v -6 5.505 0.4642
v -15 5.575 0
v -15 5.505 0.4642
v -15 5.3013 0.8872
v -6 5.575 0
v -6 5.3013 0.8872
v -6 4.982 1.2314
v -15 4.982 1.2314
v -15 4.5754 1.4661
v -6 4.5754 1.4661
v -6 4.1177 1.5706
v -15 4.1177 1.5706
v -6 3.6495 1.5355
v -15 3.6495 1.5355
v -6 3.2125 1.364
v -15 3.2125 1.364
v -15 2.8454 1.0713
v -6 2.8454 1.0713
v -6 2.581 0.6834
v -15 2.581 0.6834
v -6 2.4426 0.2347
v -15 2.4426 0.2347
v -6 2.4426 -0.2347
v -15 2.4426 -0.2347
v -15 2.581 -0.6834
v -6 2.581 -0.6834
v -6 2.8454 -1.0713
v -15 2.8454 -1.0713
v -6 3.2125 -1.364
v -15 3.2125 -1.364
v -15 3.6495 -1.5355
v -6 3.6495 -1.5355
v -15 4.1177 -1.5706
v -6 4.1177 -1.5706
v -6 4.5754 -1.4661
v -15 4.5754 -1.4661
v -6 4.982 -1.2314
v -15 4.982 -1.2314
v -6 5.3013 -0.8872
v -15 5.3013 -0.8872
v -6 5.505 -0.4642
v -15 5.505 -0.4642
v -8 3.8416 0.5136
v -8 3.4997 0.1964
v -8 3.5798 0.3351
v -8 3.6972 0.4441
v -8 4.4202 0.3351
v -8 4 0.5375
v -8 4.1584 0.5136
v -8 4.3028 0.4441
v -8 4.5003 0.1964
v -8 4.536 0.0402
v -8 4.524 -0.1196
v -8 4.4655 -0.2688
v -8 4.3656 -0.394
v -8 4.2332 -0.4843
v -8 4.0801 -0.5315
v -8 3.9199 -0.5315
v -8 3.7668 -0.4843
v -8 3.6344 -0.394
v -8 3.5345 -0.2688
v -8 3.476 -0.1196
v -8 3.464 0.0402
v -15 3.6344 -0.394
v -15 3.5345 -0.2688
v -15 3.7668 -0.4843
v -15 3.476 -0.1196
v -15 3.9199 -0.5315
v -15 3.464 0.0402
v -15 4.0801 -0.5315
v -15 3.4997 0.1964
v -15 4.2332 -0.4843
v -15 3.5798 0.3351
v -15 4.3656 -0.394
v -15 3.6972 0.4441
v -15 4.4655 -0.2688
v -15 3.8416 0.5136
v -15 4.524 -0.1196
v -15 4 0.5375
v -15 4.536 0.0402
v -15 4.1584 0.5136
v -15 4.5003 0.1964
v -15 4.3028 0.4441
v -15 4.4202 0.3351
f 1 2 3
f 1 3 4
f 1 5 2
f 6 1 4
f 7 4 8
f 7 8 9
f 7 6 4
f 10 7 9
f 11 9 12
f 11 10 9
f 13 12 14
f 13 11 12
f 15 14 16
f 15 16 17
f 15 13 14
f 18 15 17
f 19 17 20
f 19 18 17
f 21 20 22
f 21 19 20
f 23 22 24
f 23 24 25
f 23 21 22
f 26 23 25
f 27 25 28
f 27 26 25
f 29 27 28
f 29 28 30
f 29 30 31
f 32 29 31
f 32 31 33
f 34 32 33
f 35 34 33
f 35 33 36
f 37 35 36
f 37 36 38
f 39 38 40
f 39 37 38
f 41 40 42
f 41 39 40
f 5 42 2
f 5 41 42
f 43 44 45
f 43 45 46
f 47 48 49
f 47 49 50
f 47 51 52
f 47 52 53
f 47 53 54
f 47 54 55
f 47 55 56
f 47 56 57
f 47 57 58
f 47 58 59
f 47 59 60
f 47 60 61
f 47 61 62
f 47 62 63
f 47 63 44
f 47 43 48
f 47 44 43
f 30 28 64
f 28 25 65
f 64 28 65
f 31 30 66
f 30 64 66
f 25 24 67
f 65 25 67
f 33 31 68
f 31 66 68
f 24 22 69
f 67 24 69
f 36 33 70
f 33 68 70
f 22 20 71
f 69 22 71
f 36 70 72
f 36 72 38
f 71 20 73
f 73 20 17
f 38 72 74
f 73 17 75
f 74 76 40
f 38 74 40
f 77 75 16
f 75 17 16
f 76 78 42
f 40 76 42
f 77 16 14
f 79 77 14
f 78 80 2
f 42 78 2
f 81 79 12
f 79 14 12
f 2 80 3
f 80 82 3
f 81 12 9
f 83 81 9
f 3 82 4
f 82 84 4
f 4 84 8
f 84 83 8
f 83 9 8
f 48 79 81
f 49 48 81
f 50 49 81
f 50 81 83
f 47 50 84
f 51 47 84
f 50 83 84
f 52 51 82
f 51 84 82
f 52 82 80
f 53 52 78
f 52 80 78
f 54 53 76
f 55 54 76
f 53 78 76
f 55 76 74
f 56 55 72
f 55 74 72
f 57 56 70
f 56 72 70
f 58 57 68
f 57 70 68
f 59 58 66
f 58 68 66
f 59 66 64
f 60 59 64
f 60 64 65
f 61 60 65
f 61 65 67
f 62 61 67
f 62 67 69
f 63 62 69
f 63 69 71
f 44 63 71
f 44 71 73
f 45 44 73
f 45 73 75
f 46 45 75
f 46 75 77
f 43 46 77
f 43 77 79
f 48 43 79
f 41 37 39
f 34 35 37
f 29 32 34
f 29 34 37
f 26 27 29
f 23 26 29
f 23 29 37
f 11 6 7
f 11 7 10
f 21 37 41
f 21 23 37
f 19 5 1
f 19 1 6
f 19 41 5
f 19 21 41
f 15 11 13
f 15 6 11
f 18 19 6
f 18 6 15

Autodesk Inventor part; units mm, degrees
ref_plane "YZ Plane" through (0, 0, 0) normal (1, 0, 0) x (0, 1, 0)
ref_plane "XZ Plane" through (0, 0, 0) normal (0, 1, 0) x (-1, 0, 0)
ref_plane "XY Plane" through (0, 0, 0) normal (0, 0, 1) x (1, 0, 0)
sketch "Sketch1" plane through (0, 0, 0) normal (0, 1, 0) x (-1, 0, 0)
  arc A0 (0, -5) -> (0, 5) centre (0, 0) ccw
  line L0 (0, 5) -> (0, -5)
  dimension "d0" = 10
extrude "Extrusion1" add sketch "Sketch1" along normal blind 10
sketch "Sketch2" plane through (0, 0, 0) normal (1, 0, 0) x (0, 1, 0)
  line L0 (8.0172, -4.5) -> (8.0172, 4.5)
  line L1 (8.0172, 4.5) -> (2.5172, 4.5)
  line L2 (2.5172, -4.5) -> (0.0172, -2)
  line L3 (2.5172, 4.5) -> (0.0172, 2)
  line L4 (0.0172, -2) -> (0.0172, 2)
  line L5 (8.0172, -4.5) -> (2.5172, -4.5)
  point P0 (0, 0)
  dimension "d3" = 9
  dimension "d4" = 8
sketch "Sketch3" plane through (0, 0, 0) normal (1, 0, 0) x (0, 1, 0)
  line L0 (0, 2) -> (3, 5)
  arc A0 (3, 5) -> (0, 2) centre (1, 4) ccw
  line L1 (0, -2) -> (4, -6)
  arc A1 (0, -2) -> (4, -6) centre (1.75, -4.25) ccw
  line L2 (8.0325, 5) -> (11, 5)
  line L3 (11, 5) -> (11, -6)
  line L4 (11, -6) -> (8.0325, -6)
  line L5 (8.0325, -6) -> (8.0325, 5)
  line L6 (2.4911, 4.4911) -> (5, 7)
  line L7 (2.4911, 4.4911) -> (8.0325, 4.4911)
  arc A2 (8.0325, 4.4911) -> (5, 7) centre (7, 6.3303) ccw
  line L8 (2.4911, -4.4911) -> (8.5706, -4.4911)
  arc A3 (2.4911, -4.4911) -> (8.5706, -4.4911) centre (5.5309, -7.5041) ccw
  point P0 (0, 0)
extrude "Extrusion2" cut sketch "Sketch3" against normal through all
sketch "Sketch4" plane through (0, 0, 0) normal (0, 1, 0) x (-1, 0, 0)
  arc A0 (1.0726, -4.4911) -> (1.0726, 4.4911) centre (-1.125, 0) ccw
  arc A1 (1.0726, 4.4911) -> (1.0726, -4.4911) centre (-0.4517, 0) ccw
  point P0 (0, 0)
  point P1 (2.1976, -4.4911)
  point P2 (2.1976, 4.4911)
  dimension "d9" = 1.125
  dimension "d10" = 1.125
extrude "Extrusion3" cut sketch "Sketch4" along normal through all both and the other way through all
sketch "Sketch5" plane through (0, 0, 0) normal (1, 0, 0) x (0, 1, 0)
  line L0 (1.6, -1.2445) -> (1.6, 1.1555)
  line L1 (6.4325, 2.6911) -> (3.1125, 2.6911)
  line L2 (6.4325, -2.6911) -> (6.4325, 2.6911)
  line L3 (6.4325, -2.6911) -> (3.1125, -2.6911)
  line L4 (0, 2) -> (0, -2) projected
  line L5 (8.0325, 4.4911) -> (8.0325, -4.4911) projected
  line L6 (0, 2) -> (2.4911, 4.4911) projected
  line L7 (2.4911, 4.4911) -> (8.0325, 4.4911) projected
  line L8 (8.0325, 4.4911) -> (8.0325, -4.4911) projected
  line L9 (8.0325, -4.4911) -> (2.4911, -4.4911) projected
  line L10 (2.4911, -4.4911) -> (0, -2) projected
  line L11 (0, 2) -> (0, -2) projected
  line L12 (1.6, 1.1555) -> (3.1125, 2.6911)
  line L13 (1.6, -1.2445) -> (3.1125, -2.6911)
  line L14 (1.6, 4.6579) -> (1.6, -5.3823)
  arc A0 (1.6, 4.6579) -> (1.6, -5.3823) centre (3.2437, -0.3622) ccw
  line L15 (1.6, 1.1555) -> (5.4757, 5.0906)
  line L16 (1.6, 1.1555) -> (1.6, 7.5999)
  arc A1 (5.4757, 5.0906) -> (1.6, 7.5999) centre (3.8837, 6.8794) ccw
  line L17 (3.1125, 2.6911) -> (12.4034, 2.6911)
  line L18 (3.1125, 2.6911) -> (8.5318, 8.1936)
  arc A2 (12.4034, 2.6911) -> (8.5318, 8.1936) centre (8.3272, 3.9364) ccw
  line L19 (6.4325, 2.6911) -> (13.6333, 2.6911)
  line L20 (6.4325, 2.6911) -> (6.4325, -9.3636)
  arc A3 (6.4325, -9.3636) -> (13.6333, 2.6911) centre (6.37, -1.1482) ccw
  line L21 (6.4325, -2.6911) -> (6.4325, -11.5775)
  line L22 (6.4325, -2.6911) -> (3.1125, -2.6911)
  line L23 (3.1125, -2.6911) -> (3.2437, -12.8567)
  arc A4 (3.2437, -12.8567) -> (6.4325, -9.3636) centre (5.6123, -11.8169) ccw
  line L24 (1.6, -1.2445) -> (1.6, -8.2222)
  line L25 (1.6, -1.2445) -> (3.1125, -2.6911)
  line L26 (3.1125, -2.6911) -> (3.1946, -9.0574)
  arc A5 (1.6, -8.2222) -> (3.1946, -9.0574) centre (2.6381, -8.1801) ccw
  point P0 (0, 0)
  dimension "d16" = 1.6
  dimension "d18" = 1.6
  dimension "d21" = 1.8
  dimension "d23" = 1.8
  dimension "d24" = 2.4
  dimension "d26" = 3.32
  dimension "d27" = 3.32
extrude "Extrusion4" cut sketch "Sketch5" against normal through all contours L14 L10 L4 L6 L0 | L13 L23 L9 L10 L14 | L14 L6 L7 L15 L12 | L3 L20 L9 L23 | L14 A0 L6 L4 L10 | L10 L9 L23 A5 L24 L14 | L15 L7 L5 L17 L1 | L14 L16 A1 L15 L7 L6 | L2 L17 L5 L9 L20 | L9 L20 A4 L23 | L15 L18 A2 L17 L5 L7 | L9 L5 L17 L19 A3 L20
sketch "Sketch6" plane through (0, 0, 0) normal (1, 0, 0) x (0, 1, 0)
  circle A0 centre (4, 0) radius 1.575
  line L0 (1.6, -1.2445) -> (1.6, 1.1555) projected
  point P0 (0, 0)
  dimension "d31" = 3.15
  dimension "d32" = 2.4
extrude "Extrusion5" add sketch "Sketch6" against normal blind 15
sketch "Sketch7" plane through (0, 0, 0) normal (0, 1, 0) x (-1, 0, 0)
  arc A0 (3.089, -2.6911) -> (3.7176, -1.2445) centre (-1.125, 0) ccw projected
  arc A1 (3.7397, 1.1555) -> (3.089, 2.6911) centre (-1.125, 0) ccw projected
  arc A2 (3.7176, -1.2445) -> (3.7397, 1.1555) centre (-1.125, 0) ccw
  arc A3 (3.089, 2.6911) -> (3.089, -2.6911) centre (1.8078, 0) ccw
  point P0 (0, 0)
extrude "Extrusion6" cut sketch "Sketch7" along normal through all
sketch "Sketch8" plane through (-15, 4, 0) normal (-1, 0, 0) x (0, 0, 1)
  circle A0 centre (0, 0) radius 0.5375
  point P0 (0, -4)
  dimension "d37" = 1.075
extrude "Extrusion7" cut sketch "Sketch8" against normal blind 7
sketch "Sketch9" plane through (0, 0, 0) normal (0, 1, 0) x (-1, 0, 0)
  line L0 (6, 3) -> (2, 3)
  line L1 (2, 3) -> (2, -3)
  line L2 (2, -3) -> (6, -3)
  line L3 (6, -3) -> (6, 3)
  point P0 (0, 0)
extrude "Extrusion8" cut sketch "Sketch9" along normal through all both and the other way through all
properties part number "flat_cranial_window_stabilizer_Apr0119"
